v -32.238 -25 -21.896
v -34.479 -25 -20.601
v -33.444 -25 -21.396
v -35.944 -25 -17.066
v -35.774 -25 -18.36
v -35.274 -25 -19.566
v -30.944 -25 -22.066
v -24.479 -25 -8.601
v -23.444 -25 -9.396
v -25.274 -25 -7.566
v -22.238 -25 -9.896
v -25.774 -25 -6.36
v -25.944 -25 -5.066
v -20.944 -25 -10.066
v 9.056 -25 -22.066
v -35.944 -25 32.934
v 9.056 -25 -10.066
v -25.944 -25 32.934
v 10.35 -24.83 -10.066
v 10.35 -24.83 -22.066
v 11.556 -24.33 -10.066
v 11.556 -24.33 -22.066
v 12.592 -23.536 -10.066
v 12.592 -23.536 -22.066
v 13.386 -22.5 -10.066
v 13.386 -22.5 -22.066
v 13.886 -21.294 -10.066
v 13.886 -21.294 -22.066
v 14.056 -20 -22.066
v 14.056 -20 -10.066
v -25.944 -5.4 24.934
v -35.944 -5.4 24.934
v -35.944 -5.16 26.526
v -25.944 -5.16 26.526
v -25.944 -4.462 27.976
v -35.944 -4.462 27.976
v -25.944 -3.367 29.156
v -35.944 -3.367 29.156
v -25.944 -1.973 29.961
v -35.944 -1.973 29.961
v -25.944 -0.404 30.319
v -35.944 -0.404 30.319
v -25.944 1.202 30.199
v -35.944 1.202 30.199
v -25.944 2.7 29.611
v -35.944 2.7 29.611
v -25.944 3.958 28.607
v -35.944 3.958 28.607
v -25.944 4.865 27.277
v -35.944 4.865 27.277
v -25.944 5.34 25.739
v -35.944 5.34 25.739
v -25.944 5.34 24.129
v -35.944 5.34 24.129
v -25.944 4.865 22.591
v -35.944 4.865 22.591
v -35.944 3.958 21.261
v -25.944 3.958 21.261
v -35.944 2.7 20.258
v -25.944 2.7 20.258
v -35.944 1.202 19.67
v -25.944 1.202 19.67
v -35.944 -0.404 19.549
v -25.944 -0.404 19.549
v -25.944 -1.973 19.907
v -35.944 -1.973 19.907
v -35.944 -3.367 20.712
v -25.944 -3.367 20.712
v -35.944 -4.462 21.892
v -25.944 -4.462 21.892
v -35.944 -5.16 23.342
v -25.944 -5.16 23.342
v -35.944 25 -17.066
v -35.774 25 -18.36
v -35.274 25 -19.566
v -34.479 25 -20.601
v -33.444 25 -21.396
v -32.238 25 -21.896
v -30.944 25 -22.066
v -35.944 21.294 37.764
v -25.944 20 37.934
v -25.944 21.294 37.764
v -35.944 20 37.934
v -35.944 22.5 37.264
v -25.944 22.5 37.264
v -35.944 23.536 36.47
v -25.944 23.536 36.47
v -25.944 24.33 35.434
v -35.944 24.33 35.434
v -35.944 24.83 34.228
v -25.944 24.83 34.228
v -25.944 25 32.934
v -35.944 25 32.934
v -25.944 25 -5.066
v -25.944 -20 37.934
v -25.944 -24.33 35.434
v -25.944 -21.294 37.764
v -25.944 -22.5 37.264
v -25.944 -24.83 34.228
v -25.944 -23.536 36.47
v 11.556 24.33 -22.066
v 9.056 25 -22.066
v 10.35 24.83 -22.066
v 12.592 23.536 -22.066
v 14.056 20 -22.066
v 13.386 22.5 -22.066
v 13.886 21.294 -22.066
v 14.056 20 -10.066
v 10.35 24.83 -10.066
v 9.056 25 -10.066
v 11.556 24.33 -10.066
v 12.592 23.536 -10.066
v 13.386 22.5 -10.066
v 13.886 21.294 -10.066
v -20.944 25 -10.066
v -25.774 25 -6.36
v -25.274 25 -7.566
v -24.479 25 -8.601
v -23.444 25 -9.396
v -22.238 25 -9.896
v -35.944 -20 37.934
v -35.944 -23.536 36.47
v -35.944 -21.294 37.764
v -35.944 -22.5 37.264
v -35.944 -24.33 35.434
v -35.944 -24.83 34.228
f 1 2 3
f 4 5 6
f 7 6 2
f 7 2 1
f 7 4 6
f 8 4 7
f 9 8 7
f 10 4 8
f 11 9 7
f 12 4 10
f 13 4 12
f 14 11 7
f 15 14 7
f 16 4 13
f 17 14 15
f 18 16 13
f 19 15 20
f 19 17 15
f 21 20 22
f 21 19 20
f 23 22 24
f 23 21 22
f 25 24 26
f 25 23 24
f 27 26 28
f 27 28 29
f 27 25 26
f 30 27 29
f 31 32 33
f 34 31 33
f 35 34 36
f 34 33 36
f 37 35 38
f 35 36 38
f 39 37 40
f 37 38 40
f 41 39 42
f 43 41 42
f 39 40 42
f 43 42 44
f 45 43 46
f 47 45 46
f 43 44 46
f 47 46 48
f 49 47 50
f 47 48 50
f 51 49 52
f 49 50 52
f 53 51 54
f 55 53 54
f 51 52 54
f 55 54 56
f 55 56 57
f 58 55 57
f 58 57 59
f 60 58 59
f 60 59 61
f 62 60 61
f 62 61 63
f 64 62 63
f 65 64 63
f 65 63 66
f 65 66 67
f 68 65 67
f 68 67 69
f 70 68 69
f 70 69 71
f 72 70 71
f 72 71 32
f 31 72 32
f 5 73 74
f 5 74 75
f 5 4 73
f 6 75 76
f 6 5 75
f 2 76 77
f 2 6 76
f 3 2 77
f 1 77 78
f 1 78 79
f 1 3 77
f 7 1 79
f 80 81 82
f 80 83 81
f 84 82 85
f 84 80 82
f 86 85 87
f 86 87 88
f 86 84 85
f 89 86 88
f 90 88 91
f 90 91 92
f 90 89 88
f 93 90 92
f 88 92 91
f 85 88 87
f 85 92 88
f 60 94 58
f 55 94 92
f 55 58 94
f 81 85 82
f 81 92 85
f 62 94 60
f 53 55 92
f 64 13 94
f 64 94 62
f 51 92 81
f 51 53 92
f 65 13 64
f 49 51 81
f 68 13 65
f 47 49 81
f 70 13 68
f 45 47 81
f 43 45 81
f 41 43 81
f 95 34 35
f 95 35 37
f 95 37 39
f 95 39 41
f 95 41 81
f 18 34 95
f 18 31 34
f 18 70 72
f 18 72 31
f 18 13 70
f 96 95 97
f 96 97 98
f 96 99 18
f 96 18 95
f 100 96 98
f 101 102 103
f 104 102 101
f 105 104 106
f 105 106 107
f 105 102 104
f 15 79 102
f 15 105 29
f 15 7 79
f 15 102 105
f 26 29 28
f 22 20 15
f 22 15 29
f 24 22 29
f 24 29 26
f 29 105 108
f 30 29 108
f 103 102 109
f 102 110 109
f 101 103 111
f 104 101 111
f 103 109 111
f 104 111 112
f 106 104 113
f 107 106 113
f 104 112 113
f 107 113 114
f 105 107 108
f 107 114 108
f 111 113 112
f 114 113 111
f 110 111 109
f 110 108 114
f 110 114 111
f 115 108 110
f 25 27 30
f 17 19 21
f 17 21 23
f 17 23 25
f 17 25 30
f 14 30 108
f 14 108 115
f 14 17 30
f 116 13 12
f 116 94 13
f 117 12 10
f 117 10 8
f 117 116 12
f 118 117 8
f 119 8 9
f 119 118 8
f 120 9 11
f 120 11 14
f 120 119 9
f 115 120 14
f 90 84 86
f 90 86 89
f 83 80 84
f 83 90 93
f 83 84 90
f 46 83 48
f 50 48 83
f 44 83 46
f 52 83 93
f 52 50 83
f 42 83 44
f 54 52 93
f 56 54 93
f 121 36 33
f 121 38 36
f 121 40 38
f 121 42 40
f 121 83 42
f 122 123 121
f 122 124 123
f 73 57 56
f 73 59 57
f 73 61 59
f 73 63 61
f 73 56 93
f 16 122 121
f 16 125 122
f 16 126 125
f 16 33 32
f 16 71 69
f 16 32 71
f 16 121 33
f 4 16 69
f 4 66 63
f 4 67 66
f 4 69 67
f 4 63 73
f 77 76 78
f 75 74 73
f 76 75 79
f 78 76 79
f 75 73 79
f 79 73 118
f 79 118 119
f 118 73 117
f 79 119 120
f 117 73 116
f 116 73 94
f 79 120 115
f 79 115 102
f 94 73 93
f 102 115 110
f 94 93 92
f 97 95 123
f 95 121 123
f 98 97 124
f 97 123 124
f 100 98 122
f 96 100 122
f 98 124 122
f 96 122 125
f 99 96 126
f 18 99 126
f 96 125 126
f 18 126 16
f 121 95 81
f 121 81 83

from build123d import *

# Parameters (mm, degrees)
F1_DEPTH = 25
F3_D     = 10.8
F4_R     = 5


with BuildPart() as f1:
    # F0 (on Front) → F1 (new body, symmetric)
    with BuildSketch(Plane.XZ):
        Polygon((-25.943926, 37.934126), (-35.943926, 37.934126), (-35.943926, -22.065874), (14.056074, -22.065874), (14.056074, -10.065874), (-25.943926, -10.065874), align=None)
    extrude(amount=F1_DEPTH, both=True)

    # F3 (through all)
    with Locations(Plane.YZ.offset(-25.943926)):
        with Locations((0, 24.934126)):
            Hole(F3_D / 2)

    # F4
    f4_edges = [f1.edges().sort_by_distance(p)[0] for p in [
        (-30.943926, -25, 37.934126),
        (-30.943926, 25, 37.934126),
        (14.056074, -25, -16.065874),
        (14.056074, 25, -16.065874),
        (-35.943926, 0, -22.065874),
        (-25.943926, 0, -10.065874),
    ]]
    fillet(f4_edges, radius=F4_R)


solid = f1.part
